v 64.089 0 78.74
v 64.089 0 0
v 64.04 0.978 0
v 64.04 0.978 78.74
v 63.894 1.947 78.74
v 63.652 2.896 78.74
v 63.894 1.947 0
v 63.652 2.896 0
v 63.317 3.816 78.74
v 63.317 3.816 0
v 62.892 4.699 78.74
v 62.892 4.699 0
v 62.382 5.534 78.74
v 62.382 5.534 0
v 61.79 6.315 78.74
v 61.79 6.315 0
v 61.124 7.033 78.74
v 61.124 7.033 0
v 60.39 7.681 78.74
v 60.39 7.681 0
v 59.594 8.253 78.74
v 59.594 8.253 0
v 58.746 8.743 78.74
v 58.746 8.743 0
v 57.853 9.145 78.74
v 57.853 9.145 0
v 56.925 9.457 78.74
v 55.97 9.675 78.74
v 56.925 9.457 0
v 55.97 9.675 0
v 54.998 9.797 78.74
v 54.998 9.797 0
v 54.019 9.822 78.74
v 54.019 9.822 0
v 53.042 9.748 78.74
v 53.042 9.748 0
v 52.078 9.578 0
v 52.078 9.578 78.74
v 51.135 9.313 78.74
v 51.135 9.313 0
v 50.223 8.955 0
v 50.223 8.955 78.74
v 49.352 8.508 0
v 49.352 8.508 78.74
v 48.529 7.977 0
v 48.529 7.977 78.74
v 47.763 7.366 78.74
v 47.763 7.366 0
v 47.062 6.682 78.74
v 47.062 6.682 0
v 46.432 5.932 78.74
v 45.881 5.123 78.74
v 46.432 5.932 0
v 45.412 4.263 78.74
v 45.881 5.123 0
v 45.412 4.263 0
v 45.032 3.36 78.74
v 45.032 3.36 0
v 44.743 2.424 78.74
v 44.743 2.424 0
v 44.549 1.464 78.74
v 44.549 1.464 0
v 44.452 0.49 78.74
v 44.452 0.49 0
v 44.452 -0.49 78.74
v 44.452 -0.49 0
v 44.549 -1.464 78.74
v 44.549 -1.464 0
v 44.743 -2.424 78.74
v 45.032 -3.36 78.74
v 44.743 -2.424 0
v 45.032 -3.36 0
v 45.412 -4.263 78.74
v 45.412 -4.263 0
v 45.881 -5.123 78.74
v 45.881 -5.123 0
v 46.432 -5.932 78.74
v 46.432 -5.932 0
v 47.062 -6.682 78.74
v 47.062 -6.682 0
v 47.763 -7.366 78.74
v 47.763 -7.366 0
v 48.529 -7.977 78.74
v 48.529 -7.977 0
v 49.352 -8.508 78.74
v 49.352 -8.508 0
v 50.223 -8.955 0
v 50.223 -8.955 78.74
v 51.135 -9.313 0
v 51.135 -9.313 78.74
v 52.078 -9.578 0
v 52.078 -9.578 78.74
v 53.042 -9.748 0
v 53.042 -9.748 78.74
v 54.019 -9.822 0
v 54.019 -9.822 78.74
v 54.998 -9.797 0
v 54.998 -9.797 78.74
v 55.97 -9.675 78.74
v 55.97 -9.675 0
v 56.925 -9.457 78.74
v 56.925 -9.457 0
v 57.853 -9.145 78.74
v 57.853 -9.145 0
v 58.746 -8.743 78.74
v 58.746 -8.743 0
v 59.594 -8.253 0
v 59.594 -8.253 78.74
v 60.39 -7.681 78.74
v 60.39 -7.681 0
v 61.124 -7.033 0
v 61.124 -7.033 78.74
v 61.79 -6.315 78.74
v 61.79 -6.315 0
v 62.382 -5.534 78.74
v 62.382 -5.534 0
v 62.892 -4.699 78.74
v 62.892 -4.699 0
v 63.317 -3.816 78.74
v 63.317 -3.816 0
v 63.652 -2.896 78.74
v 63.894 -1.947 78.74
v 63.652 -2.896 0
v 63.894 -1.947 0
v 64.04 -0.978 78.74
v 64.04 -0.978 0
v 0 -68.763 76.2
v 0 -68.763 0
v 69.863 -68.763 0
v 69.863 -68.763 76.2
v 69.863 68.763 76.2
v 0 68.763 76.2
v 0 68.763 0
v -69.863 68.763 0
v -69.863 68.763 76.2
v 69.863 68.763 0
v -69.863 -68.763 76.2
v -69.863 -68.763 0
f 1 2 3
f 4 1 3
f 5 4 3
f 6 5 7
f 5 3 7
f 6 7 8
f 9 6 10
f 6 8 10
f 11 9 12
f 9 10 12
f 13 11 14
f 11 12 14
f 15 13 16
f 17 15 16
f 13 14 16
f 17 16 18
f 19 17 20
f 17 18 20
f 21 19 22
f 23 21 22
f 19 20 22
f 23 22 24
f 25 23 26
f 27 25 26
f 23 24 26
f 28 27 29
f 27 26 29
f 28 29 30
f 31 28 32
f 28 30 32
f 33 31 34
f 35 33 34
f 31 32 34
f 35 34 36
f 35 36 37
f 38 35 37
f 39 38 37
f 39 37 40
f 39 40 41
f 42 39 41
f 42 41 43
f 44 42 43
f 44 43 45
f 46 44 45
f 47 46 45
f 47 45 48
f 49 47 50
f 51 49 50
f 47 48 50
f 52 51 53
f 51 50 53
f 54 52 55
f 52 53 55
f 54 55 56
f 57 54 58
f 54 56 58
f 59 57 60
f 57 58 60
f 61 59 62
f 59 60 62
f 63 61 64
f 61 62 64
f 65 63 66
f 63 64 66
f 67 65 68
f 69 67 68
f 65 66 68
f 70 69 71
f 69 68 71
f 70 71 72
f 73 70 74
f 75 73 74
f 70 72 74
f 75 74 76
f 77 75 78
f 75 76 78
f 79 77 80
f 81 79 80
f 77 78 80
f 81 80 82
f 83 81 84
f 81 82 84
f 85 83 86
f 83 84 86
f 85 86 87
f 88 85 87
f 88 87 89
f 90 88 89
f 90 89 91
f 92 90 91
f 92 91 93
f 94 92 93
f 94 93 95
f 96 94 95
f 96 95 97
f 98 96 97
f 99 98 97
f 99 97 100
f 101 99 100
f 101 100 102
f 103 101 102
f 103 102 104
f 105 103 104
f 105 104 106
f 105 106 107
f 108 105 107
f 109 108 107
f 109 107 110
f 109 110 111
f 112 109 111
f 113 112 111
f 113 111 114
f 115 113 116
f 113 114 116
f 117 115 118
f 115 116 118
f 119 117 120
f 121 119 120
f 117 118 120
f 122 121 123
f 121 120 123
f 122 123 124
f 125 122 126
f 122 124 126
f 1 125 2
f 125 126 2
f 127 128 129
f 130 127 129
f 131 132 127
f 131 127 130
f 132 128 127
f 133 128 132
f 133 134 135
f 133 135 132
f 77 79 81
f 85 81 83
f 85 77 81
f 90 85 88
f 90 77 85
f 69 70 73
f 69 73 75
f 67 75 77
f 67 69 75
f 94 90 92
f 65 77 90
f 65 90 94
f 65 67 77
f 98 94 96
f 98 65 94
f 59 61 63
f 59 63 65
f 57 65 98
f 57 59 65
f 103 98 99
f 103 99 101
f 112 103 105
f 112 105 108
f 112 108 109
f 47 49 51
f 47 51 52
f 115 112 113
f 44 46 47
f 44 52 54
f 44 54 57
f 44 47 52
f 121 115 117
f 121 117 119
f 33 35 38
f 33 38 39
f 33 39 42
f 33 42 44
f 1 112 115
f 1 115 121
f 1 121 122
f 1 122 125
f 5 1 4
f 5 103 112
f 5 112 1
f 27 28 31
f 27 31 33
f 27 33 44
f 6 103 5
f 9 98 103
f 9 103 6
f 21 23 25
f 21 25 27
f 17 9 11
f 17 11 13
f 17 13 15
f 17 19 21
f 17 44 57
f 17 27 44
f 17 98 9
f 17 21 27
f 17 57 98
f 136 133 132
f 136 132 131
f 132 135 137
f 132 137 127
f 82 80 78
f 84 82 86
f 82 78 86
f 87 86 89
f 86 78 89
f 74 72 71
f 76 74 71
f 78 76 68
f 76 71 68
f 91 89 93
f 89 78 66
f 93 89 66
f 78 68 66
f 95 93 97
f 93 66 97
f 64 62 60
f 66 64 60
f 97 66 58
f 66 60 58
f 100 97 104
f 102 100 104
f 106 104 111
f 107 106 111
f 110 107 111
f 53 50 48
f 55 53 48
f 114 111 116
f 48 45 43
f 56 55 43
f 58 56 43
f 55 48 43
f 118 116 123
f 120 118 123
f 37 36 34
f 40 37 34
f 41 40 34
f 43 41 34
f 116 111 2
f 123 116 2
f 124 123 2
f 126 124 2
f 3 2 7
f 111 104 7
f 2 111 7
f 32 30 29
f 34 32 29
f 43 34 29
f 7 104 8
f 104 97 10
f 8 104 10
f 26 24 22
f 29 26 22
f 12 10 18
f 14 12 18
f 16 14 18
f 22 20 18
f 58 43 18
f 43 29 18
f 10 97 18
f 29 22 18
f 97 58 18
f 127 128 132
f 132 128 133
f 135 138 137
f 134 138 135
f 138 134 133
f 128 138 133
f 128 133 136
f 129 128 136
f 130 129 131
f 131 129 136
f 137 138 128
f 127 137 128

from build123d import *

# Parameters (mm, degrees)
F0_W     = 69.863096
F0_H     = 137.526572
F2_DEPTH = 76.2
F1_R     = 9.824635
F3_DEPTH = 78.74
F4_DEPTH = 76.2


with BuildPart() as f2:
    # F0 (on Top) → F2 (new body)
    with BuildSketch(Plane.XY):
        with Locations((-34.931548, 0)):
            Rectangle(F0_W, F0_H)
    extrude(amount=F2_DEPTH)


with BuildPart() as f3:
    # F1 (on Top) → F3 (new body)
    with BuildSketch(Plane.XY):
        with Locations((54.264009, 0)):
            Circle(F1_R)
    extrude(amount=F3_DEPTH)


with BuildPart() as f4:
    # F0 (on Top) → F4 (new body)
    with BuildSketch(Plane.XY):
        with Locations((34.931548, 0)):
            Rectangle(F0_W, F0_H)
    extrude(amount=F4_DEPTH)


solid = Compound([f2.part, f3.part, f4.part])
